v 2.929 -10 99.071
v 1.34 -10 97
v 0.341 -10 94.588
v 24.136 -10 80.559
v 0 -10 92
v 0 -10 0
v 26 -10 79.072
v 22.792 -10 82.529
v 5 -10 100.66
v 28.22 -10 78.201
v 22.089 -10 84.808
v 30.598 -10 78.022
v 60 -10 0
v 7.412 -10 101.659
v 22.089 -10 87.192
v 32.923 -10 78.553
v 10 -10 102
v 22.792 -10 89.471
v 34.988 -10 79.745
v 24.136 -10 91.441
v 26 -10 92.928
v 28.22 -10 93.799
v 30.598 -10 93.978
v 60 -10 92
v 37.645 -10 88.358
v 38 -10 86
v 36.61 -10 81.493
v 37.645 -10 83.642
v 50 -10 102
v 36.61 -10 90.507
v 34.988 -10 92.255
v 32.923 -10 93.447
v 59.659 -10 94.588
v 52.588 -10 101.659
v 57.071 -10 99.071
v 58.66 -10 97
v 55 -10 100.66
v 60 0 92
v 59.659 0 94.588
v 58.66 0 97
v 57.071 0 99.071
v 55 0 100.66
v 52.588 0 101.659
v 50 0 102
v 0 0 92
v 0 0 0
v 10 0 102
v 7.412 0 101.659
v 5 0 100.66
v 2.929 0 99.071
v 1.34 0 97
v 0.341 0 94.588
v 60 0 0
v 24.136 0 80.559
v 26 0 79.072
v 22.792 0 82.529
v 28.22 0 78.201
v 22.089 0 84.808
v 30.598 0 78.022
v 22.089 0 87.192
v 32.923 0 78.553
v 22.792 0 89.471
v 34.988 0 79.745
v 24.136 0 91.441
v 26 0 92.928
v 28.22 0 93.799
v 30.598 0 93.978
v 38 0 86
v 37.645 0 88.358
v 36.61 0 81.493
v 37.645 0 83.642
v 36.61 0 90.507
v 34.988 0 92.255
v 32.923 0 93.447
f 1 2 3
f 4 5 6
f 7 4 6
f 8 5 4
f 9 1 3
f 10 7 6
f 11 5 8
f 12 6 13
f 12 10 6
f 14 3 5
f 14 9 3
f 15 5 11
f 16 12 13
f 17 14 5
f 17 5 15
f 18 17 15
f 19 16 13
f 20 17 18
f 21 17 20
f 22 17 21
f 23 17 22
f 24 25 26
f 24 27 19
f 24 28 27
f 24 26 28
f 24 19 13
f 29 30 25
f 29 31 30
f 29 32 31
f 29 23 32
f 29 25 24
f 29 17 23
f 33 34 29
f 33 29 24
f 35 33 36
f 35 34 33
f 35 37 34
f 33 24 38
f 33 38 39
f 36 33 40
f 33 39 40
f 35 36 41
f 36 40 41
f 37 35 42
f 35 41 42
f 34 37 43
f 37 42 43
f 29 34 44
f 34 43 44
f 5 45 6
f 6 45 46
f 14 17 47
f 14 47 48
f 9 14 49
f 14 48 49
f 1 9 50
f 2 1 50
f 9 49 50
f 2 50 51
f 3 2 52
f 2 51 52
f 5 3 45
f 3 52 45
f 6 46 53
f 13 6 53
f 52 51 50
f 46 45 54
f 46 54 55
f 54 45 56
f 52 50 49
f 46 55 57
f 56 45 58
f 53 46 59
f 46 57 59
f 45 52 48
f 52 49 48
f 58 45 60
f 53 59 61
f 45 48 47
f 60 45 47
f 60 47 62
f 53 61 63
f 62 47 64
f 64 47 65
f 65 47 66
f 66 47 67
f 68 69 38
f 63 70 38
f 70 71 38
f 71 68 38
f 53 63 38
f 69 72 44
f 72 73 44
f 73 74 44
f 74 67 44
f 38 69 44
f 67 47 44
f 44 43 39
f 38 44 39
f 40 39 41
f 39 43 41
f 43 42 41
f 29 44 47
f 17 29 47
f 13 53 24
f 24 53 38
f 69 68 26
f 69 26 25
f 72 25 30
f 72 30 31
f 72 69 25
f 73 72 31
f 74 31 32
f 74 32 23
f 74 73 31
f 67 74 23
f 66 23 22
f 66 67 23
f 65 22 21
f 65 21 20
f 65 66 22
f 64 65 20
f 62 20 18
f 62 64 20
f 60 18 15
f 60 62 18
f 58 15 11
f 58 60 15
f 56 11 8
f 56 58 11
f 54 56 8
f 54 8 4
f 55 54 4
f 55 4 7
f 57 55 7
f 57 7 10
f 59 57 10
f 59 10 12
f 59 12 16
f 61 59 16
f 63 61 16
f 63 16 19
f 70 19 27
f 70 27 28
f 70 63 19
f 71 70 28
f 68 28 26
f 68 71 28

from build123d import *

# Parameters (mm, degrees)
F0_R     = 8
F1_DEPTH = 10


with BuildPart() as f1:
    # F0 (on Front) → F1 (new body)
    with BuildSketch(Plane.XZ):
        with BuildLine():
            Line((0, 92), (0, 0))
            Line((0, 0), (60, 0))
            Line((60, 0), (60, 92))
            ThreePointArc((60, 92), (57.071068, 99.071068), (50, 102))
            Line((50, 102), (10, 102))
            ThreePointArc((10, 102), (2.928932, 99.071068), (0, 92))
        make_face()
        with Locations((30, 86)):
            Circle(F0_R, mode=Mode.SUBTRACT)
    extrude(amount=F1_DEPTH)


solid = f1.part
